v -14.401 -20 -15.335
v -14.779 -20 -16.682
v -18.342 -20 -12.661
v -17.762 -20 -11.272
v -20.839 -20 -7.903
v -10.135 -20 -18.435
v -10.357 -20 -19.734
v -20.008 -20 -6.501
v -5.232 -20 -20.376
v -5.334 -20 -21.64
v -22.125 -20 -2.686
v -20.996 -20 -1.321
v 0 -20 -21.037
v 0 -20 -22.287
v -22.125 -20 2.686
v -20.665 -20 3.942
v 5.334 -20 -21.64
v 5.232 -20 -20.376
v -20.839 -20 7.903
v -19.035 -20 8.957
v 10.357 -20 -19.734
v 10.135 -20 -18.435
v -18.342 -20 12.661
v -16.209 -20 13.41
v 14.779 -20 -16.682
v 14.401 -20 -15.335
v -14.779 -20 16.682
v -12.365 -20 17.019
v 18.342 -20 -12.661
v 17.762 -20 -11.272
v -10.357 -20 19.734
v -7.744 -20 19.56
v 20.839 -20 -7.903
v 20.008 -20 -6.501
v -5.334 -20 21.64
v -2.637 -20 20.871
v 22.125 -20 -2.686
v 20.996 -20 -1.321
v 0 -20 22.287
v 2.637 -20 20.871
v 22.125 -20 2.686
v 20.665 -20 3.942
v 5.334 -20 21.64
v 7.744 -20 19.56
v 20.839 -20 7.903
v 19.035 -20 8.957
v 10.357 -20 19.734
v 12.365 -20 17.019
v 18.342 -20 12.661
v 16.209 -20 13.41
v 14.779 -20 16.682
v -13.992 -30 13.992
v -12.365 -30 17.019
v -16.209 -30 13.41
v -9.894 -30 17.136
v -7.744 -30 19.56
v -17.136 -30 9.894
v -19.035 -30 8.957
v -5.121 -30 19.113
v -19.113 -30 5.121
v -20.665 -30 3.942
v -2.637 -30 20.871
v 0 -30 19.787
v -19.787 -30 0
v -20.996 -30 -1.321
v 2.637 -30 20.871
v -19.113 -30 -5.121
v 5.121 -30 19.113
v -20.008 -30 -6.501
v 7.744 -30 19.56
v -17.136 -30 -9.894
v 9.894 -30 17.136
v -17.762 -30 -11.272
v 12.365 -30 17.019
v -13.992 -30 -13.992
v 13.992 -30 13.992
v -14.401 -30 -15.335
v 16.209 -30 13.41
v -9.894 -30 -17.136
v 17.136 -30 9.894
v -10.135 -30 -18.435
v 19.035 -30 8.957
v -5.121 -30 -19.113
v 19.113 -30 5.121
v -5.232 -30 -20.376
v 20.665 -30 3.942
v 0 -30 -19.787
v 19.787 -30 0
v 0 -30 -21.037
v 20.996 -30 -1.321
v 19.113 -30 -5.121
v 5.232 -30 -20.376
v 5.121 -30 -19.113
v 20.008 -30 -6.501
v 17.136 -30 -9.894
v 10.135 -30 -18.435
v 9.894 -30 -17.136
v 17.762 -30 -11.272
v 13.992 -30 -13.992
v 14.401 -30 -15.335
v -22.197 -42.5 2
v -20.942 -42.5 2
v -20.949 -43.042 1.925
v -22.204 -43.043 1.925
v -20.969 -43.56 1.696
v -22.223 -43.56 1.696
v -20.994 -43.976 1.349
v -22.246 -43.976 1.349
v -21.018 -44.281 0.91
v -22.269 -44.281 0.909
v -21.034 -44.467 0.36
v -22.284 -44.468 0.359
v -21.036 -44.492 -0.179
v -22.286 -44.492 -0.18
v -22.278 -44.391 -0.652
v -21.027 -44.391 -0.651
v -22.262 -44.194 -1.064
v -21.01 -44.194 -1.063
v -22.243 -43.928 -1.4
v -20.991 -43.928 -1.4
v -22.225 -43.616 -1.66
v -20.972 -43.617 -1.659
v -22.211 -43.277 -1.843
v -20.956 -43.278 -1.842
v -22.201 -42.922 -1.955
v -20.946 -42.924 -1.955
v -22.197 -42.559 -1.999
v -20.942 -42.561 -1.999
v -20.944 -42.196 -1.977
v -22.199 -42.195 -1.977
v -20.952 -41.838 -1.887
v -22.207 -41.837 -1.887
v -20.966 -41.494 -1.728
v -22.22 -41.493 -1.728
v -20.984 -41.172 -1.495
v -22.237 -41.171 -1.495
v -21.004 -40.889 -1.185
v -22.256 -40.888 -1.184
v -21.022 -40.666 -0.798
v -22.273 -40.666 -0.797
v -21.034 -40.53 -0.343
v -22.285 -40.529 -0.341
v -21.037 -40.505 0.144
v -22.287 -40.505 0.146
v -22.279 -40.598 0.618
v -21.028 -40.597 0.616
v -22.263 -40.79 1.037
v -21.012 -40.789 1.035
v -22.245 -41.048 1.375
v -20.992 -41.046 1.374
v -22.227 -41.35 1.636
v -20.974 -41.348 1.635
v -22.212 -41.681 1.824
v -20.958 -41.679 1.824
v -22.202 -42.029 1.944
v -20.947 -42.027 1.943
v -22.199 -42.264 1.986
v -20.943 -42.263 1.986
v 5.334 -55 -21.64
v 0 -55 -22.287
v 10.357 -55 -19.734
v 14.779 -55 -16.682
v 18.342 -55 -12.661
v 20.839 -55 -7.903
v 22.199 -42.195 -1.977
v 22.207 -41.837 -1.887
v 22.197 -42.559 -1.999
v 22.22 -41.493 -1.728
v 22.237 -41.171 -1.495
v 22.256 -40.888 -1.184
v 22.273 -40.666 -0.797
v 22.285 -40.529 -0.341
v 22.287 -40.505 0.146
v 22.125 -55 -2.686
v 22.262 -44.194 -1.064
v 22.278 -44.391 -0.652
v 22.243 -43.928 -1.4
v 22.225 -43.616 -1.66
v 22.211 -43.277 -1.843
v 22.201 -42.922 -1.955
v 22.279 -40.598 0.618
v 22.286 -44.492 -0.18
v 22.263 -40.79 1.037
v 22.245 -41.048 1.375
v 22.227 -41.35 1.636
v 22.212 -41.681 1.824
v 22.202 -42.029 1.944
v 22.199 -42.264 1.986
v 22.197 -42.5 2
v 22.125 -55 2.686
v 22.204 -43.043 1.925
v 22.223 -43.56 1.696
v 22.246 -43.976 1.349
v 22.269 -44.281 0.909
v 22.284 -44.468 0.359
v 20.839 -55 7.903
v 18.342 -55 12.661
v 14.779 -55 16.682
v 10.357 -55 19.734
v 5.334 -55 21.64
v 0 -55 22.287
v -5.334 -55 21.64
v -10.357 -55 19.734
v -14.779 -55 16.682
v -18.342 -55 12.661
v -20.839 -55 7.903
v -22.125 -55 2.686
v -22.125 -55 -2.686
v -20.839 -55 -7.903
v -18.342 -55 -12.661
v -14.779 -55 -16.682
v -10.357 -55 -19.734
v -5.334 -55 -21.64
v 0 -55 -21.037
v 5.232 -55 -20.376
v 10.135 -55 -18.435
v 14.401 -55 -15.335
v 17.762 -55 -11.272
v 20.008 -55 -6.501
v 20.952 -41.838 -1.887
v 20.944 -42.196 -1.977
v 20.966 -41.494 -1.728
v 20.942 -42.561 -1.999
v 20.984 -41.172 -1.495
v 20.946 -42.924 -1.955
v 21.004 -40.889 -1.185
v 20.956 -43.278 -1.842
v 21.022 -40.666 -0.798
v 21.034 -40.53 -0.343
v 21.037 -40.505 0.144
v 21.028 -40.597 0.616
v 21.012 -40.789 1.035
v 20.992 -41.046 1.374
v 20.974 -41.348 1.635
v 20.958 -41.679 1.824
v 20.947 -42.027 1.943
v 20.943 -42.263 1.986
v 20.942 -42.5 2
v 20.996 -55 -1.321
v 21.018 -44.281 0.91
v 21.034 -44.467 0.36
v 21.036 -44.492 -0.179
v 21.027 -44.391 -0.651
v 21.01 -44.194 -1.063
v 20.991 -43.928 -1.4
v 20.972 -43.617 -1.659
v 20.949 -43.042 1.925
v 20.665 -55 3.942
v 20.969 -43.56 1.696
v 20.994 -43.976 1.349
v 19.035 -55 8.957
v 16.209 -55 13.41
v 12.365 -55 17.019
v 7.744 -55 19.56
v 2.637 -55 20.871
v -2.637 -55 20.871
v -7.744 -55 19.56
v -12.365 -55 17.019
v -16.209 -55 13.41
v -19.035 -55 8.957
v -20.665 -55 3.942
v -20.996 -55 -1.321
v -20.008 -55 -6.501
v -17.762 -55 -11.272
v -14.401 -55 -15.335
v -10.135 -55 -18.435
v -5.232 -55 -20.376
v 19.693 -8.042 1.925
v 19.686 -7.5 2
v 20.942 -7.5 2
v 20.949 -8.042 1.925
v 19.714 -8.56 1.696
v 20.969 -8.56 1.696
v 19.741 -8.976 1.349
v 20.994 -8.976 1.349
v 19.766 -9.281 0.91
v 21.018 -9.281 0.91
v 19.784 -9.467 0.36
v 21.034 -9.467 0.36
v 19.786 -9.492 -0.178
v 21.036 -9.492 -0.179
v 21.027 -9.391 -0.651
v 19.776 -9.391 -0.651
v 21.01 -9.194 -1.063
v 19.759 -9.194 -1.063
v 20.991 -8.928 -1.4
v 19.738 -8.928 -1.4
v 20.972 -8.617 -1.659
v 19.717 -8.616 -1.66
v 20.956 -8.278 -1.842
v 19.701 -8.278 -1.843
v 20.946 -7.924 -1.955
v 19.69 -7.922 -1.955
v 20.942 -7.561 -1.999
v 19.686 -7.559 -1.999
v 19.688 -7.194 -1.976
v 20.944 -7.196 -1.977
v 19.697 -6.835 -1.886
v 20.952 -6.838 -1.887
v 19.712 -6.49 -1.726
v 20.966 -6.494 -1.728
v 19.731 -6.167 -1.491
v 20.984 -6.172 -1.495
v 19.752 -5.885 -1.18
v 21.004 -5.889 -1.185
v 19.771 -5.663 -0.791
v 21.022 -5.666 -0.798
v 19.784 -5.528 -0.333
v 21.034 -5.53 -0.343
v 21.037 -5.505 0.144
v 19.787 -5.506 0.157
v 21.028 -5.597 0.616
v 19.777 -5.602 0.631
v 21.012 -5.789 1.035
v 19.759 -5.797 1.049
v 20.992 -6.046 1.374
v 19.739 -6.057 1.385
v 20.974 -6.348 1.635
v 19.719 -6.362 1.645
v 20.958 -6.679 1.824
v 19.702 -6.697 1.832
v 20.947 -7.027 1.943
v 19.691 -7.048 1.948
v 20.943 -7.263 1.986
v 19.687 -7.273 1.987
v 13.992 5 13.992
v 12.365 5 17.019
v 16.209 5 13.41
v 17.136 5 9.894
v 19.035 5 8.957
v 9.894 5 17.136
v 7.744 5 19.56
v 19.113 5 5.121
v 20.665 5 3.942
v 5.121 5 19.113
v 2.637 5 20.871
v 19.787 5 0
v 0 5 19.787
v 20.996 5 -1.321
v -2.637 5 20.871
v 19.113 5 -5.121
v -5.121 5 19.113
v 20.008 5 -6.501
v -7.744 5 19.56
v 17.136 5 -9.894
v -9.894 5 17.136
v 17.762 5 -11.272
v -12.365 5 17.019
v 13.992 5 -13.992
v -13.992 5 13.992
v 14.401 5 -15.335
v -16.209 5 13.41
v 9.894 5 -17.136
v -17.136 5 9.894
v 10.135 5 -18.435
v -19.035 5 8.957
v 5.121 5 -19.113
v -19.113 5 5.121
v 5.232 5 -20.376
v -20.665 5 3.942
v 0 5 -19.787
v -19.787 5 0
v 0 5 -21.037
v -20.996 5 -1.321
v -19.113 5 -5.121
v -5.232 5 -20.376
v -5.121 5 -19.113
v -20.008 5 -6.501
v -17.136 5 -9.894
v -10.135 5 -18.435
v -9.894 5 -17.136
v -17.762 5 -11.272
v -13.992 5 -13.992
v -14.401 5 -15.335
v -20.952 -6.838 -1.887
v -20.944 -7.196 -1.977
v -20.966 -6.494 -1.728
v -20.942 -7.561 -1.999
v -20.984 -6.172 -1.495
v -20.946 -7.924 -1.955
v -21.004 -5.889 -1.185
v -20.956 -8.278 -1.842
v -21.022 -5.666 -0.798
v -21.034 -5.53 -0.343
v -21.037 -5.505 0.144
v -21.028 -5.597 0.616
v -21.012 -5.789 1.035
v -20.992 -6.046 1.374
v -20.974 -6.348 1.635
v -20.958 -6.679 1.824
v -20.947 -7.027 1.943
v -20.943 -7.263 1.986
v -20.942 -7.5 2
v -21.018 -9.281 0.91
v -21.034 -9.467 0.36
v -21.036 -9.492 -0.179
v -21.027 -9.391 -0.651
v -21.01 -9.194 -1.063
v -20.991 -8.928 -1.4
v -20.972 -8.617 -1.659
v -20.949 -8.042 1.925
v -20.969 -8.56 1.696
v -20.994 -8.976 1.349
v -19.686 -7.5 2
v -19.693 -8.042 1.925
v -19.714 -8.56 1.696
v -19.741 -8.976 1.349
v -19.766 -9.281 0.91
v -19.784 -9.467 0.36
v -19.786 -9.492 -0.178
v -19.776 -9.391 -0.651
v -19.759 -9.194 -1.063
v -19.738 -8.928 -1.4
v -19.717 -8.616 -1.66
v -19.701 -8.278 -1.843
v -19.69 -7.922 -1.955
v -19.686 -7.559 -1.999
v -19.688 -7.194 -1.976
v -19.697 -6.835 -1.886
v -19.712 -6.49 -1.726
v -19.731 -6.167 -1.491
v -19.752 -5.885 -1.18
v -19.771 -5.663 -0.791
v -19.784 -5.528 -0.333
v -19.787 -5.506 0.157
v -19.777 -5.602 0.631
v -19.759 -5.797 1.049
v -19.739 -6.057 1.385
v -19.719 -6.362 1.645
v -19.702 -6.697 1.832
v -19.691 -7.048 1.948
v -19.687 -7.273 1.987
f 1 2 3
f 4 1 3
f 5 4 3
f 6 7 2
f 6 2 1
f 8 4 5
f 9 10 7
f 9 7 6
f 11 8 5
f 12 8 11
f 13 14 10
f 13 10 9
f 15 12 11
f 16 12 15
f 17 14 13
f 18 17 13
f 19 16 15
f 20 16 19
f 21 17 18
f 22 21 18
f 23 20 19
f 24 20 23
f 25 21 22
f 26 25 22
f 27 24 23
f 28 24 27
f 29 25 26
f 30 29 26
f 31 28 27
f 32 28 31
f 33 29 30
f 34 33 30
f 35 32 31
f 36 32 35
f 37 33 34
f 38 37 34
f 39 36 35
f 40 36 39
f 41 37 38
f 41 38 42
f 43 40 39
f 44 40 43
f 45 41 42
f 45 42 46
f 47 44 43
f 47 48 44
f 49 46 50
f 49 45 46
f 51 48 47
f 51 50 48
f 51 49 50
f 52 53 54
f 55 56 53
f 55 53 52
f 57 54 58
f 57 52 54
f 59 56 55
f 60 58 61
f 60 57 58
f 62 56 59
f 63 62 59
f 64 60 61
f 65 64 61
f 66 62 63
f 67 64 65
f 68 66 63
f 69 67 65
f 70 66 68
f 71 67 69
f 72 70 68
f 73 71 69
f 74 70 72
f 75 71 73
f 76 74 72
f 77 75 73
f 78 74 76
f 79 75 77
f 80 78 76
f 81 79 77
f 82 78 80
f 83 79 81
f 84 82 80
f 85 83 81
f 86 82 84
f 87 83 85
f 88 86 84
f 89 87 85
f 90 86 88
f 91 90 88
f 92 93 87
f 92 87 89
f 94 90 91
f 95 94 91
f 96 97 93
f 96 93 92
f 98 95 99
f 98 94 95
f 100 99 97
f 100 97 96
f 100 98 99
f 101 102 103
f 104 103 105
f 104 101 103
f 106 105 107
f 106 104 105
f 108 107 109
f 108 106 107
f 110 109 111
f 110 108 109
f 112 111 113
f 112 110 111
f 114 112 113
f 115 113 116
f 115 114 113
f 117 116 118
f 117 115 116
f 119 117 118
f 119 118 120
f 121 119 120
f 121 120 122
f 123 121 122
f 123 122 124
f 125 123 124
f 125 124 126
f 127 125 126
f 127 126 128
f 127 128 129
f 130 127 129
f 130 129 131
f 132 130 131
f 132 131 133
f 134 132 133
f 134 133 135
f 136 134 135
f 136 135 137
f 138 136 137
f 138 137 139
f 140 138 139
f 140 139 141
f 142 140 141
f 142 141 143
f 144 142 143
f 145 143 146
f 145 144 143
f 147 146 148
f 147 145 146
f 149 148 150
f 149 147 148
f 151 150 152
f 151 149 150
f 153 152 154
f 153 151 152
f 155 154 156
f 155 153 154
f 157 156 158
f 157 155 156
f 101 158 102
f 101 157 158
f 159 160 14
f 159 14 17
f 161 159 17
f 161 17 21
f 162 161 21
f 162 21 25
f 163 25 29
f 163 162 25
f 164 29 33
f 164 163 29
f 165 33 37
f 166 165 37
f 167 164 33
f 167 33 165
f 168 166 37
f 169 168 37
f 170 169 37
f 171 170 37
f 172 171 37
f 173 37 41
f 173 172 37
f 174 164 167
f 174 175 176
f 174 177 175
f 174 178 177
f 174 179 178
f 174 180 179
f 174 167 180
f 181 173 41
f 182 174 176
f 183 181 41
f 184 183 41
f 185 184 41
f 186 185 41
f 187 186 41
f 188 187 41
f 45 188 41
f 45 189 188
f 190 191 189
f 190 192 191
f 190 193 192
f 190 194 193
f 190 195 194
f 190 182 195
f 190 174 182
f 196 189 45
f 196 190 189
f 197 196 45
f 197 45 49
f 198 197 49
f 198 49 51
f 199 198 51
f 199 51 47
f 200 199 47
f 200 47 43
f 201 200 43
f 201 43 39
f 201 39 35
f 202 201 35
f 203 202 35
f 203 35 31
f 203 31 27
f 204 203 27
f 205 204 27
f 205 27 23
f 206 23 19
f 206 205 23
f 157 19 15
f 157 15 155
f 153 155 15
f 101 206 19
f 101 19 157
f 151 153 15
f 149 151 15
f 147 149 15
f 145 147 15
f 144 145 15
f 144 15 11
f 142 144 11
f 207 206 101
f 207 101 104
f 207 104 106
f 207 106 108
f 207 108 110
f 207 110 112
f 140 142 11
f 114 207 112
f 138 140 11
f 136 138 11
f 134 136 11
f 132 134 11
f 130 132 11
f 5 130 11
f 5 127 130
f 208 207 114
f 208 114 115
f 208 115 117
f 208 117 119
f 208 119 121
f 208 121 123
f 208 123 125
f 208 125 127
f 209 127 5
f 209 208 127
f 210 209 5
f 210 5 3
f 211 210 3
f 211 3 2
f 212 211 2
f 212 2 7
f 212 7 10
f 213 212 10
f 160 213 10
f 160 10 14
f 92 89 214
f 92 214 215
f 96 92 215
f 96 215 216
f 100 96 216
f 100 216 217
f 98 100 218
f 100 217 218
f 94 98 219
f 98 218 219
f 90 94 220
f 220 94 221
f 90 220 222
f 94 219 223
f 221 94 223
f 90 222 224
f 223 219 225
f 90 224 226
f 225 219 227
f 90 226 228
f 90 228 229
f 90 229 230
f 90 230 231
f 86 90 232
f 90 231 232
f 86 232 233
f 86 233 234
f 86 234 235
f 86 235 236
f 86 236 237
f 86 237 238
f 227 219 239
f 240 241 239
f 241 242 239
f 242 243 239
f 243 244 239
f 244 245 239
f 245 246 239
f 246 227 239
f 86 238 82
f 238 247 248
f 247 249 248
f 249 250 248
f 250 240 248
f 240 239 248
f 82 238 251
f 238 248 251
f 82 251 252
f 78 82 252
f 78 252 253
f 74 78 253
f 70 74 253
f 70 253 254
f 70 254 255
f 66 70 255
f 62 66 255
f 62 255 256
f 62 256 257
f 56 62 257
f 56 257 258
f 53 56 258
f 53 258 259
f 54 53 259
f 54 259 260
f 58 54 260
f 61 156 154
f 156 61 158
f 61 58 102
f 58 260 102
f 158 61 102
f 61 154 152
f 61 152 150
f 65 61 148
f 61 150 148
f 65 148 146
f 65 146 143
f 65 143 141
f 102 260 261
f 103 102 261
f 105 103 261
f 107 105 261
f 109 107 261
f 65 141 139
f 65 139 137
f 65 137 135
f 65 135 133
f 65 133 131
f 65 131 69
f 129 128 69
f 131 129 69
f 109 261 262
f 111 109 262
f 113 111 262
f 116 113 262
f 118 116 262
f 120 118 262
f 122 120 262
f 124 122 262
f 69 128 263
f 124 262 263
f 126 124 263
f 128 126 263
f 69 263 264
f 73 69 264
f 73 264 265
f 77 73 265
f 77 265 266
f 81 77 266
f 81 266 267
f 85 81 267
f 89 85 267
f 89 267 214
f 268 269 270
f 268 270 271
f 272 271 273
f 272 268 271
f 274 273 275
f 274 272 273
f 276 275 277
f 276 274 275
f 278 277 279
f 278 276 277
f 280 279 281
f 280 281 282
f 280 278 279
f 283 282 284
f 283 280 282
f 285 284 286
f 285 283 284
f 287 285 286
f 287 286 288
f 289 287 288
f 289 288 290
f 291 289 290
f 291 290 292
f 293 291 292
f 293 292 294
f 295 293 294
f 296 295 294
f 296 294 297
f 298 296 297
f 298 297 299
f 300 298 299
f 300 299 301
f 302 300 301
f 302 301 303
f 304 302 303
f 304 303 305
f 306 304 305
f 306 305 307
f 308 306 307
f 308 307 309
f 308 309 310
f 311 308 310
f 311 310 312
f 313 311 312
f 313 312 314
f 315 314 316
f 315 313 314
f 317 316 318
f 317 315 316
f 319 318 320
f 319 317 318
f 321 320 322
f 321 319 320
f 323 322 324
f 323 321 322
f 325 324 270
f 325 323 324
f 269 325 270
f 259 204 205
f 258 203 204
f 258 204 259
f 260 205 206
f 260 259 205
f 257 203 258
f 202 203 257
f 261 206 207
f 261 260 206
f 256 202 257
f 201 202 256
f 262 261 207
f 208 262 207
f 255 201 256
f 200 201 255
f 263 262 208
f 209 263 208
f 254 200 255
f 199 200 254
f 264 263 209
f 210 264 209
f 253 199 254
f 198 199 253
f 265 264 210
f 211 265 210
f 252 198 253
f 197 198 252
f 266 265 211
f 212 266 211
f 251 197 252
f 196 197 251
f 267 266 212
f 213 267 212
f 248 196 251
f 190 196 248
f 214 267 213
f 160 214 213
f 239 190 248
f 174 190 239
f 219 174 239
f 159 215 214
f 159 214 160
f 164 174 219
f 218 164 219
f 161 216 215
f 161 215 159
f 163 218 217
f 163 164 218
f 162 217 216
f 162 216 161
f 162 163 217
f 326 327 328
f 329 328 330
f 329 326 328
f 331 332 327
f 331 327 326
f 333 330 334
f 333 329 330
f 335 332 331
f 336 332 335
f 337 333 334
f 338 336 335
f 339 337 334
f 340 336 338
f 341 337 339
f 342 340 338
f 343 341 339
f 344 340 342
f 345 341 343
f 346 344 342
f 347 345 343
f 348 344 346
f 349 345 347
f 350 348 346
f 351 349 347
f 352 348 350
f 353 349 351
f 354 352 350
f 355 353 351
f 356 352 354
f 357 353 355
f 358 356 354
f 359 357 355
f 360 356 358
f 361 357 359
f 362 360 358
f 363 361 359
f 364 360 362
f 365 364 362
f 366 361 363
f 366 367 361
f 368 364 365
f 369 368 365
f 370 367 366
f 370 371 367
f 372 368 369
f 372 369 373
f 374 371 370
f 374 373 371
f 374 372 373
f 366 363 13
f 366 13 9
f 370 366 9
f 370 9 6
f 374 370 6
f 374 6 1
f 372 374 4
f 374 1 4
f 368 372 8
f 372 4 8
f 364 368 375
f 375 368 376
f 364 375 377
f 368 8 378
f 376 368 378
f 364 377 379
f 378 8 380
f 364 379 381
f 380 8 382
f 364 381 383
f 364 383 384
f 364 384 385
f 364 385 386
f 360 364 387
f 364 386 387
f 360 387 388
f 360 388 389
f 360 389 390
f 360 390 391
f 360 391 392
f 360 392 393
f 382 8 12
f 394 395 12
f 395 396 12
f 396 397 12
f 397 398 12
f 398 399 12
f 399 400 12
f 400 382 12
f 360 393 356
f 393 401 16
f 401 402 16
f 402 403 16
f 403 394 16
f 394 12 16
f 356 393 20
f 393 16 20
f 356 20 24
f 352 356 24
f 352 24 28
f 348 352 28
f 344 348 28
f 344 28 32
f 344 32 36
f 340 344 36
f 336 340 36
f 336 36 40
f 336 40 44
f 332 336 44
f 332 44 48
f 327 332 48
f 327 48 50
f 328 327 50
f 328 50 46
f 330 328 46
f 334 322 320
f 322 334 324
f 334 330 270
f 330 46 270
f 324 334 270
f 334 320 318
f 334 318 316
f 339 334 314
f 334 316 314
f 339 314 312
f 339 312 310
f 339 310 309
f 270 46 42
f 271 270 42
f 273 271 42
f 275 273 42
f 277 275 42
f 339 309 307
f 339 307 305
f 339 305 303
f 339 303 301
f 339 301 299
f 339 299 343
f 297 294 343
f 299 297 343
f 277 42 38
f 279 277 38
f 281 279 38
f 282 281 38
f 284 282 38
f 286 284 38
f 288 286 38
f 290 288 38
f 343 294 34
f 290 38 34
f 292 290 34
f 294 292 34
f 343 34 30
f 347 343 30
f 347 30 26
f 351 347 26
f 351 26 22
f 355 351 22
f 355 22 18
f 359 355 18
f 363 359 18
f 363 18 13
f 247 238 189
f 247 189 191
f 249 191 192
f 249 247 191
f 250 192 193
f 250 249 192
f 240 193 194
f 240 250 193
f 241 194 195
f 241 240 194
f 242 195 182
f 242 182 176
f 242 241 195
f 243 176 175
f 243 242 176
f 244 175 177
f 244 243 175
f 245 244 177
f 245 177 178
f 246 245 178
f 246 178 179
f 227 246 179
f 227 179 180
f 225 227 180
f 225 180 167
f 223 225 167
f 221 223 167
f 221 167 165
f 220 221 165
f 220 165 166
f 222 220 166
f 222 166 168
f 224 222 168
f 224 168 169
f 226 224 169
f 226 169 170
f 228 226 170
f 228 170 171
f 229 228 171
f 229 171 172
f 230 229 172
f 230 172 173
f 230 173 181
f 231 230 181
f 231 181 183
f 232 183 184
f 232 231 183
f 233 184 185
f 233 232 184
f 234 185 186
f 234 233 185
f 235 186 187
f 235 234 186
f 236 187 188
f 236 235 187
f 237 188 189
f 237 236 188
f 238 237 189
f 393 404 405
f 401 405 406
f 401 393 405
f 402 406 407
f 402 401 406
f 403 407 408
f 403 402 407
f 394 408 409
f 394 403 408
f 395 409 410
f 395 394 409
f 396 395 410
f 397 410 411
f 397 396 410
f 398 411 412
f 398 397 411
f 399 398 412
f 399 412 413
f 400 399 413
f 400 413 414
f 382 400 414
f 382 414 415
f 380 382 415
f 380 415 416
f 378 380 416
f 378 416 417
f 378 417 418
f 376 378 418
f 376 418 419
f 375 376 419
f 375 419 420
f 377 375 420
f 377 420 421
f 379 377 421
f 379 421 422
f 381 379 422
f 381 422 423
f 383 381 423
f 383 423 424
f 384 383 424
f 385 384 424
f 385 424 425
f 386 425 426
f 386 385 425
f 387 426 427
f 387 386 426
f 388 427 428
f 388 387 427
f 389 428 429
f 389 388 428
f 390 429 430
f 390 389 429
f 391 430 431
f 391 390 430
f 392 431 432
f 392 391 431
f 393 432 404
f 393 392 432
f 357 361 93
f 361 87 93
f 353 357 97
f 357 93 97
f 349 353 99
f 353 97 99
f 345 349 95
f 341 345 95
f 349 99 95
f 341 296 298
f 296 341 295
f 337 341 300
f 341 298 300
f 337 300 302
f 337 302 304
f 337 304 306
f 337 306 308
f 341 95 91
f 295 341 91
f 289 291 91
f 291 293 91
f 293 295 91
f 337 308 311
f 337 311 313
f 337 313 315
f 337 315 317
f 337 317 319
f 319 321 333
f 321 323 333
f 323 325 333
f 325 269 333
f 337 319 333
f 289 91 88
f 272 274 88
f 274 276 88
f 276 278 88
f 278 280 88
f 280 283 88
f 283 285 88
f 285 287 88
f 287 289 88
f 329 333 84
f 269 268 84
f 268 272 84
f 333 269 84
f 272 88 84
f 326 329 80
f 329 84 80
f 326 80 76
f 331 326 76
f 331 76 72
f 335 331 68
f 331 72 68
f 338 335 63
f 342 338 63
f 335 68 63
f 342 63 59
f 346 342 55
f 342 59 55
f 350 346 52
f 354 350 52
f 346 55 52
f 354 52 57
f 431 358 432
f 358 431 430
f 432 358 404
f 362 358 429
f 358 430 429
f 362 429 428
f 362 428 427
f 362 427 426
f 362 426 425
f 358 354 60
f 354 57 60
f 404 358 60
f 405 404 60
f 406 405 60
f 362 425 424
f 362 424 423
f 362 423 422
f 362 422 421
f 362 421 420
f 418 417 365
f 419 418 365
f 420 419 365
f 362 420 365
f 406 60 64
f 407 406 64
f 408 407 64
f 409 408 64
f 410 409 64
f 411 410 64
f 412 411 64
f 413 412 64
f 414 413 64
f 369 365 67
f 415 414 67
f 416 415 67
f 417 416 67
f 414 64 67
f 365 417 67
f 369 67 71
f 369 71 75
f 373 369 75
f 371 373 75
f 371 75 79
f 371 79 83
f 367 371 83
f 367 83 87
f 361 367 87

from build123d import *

# Parameters (mm, degrees)
SKETCH1_R               = 34
BOSS_EXTRUDE1_DEPTH     = 10
SKETCH2_R               = 19.7871926
SKETCH2_R_2             = 2
CUT_EXTRUDE1_DEPTH      = 10
SKETCH3_R               = 4.837531333
SKETCH4_W               = 4.837531333
SKETCH4_H               = 4.837531333
CUT_EXTRUDE3_DEPTH      = 38
CUT_EXTRUDE3_DEPTH_BACK = 38
SKETCH5_W               = 72.361656805
SKETCH5_H               = 8.896778435
BOSS_EXTRUDE2_START     = 60
SKETCH6_R               = 22.2871926
SKETCH6_R_2             = 19.7871926
BOSS_EXTRUDE2_DEPTH     = 60
SKETCH7_R               = 21.0371926
SKETCH7_R_2             = 19.7871926
CUT_EXTRUDE4_DEPTH      = 25
CUT_EXTRUDE6_DEPTH      = 25
CUT_EXTRUDE6_DEPTH_BACK = 25
SKETCH8_R               = 2
CUT_EXTRUDE7_DEPTH      = 43
CUT_EXTRUDE7_DEPTH_BACK = 53
SKETCH9_W               = 69.351432881
SKETCH9_H               = 5.737807944
CUT_EXTRUDE8_START      = -25
SKETCH10_R              = 22.2871926
SKETCH10_R_2            = 21.0371926
CUT_EXTRUDE8_DEPTH      = 25
CUT_EXTRUDE9_DEPTH      = 30
CUT_EXTRUDE9_DEPTH_BACK = 30
SKETCH11_R              = 2


with BuildPart() as part:
    # Sketch1 → Boss-Extrude1 (new body)
    with BuildSketch(Plane(origin=(0, 0, 0), x_dir=(1, 0, 0), z_dir=(0, 1, 0))):
        Circle(SKETCH1_R)
    extrude(amount=BOSS_EXTRUDE1_DEPTH)

    # Sketch2 → Cut-Extrude1 (cut)
    with BuildSketch(Plane.XZ):
        Circle(SKETCH2_R)
        with Locations((-22.1, 12.5)):
            Circle(SKETCH2_R_2)
        with Locations((22.1, 12.5)):
            Circle(SKETCH2_R_2)
        with Locations((22.1, -12.5)):
            Circle(SKETCH2_R_2)
        with Locations((-22.1, -12.5)):
            Circle(SKETCH2_R_2)
    extrude(amount=-CUT_EXTRUDE1_DEPTH, mode=Mode.SUBTRACT)

    # Sketch3 → Cut-Revolve1 (revolve, cut)
    with BuildSketch(Plane(origin=(0, 0, 0), x_dir=(0, 0, -1), z_dir=(1, 0, 0))):
        with Locations((-34, 5)):
            Circle(SKETCH3_R)
    revolve(axis=Axis((0, 0, 0), (0, 1, 0)), mode=Mode.SUBTRACT)

    # Sketch4 → Cut-Revolve2 (revolve, cut)
    with BuildSketch(Plane(origin=(0, 0, 0), x_dir=(0, 0, -1), z_dir=(1, 0, 0))):
        with Locations((-31.581234333, 2.581234333)):
            Rectangle(SKETCH4_W, SKETCH4_H)
    revolve(axis=Axis((0, 0, 0), (0, 1, 0)), mode=Mode.SUBTRACT)

    # Sketch5 → Cut-Extrude3 (cut, two sides: drawn at the far end of the back side and taken through both)
    with BuildSketch(Plane(origin=(0, 0, 0), x_dir=(0, 0, -1), z_dir=(1, 0, 0)).offset(-CUT_EXTRUDE3_DEPTH_BACK)):
        with Locations((-0.901301775, 0.551610782)):
            Rectangle(SKETCH5_W, SKETCH5_H)
    extrude(amount=CUT_EXTRUDE3_DEPTH + CUT_EXTRUDE3_DEPTH_BACK, mode=Mode.SUBTRACT)

    # Sketch6 → Boss-Extrude2 (add)
    with BuildSketch(Plane.XZ.offset(-5).offset(BOSS_EXTRUDE2_START)):
        Circle(SKETCH6_R)
        Circle(SKETCH6_R_2, mode=Mode.SUBTRACT)
    extrude(amount=-BOSS_EXTRUDE2_DEPTH)

    # Sketch7 → Cut-Extrude4 (cut)
    with BuildSketch(Plane.XZ.offset(55)):
        Circle(SKETCH7_R)
        Circle(SKETCH7_R_2, mode=Mode.SUBTRACT)
    extrude(amount=-CUT_EXTRUDE4_DEPTH, mode=Mode.SUBTRACT)

    # Sketch8 → Cut-Extrude6 (cut, two sides: drawn at the far end of the back side and taken through both)
    with BuildSketch(Plane(origin=(0, 0, 0), x_dir=(0, 0, -1), z_dir=(1, 0, 0)).offset(-CUT_EXTRUDE6_DEPTH_BACK)):
        with Locations((0, -42.5)):
            Circle(SKETCH8_R)
    extrude(amount=CUT_EXTRUDE6_DEPTH + CUT_EXTRUDE6_DEPTH_BACK, mode=Mode.SUBTRACT)

    # Sketch9 → Cut-Extrude7 (cut, two sides: drawn at the far end of the back side and taken through both)
    with BuildSketch(Plane(origin=(0, 0, 0), x_dir=(0, 0, -1), z_dir=(1, 0, 0)).offset(-CUT_EXTRUDE7_DEPTH_BACK)):
        with Locations((0.165912519, 7.868903972)):
            Rectangle(SKETCH9_W, SKETCH9_H)
    extrude(amount=CUT_EXTRUDE7_DEPTH + CUT_EXTRUDE7_DEPTH_BACK, mode=Mode.SUBTRACT)

    # Sketch10 → Cut-Extrude8 (cut)
    with BuildSketch(Plane(origin=(0, 5, 0), x_dir=(1, 0, 0), z_dir=(0, 1, 0)).offset(CUT_EXTRUDE8_START)):
        Circle(SKETCH10_R)
        Circle(SKETCH10_R_2, mode=Mode.SUBTRACT)
    extrude(amount=CUT_EXTRUDE8_DEPTH, mode=Mode.SUBTRACT)

    # Sketch11 → Cut-Extrude9 (cut, two sides: drawn at the far end of the back side and taken through both)
    with BuildSketch(Plane(origin=(0, 0, 0), x_dir=(0, 0, -1), z_dir=(1, 0, 0)).offset(-CUT_EXTRUDE9_DEPTH_BACK)):
        with Locations((0, -7.5)):
            Circle(SKETCH11_R)
    extrude(amount=CUT_EXTRUDE9_DEPTH + CUT_EXTRUDE9_DEPTH_BACK, mode=Mode.SUBTRACT)


solid = part.part
